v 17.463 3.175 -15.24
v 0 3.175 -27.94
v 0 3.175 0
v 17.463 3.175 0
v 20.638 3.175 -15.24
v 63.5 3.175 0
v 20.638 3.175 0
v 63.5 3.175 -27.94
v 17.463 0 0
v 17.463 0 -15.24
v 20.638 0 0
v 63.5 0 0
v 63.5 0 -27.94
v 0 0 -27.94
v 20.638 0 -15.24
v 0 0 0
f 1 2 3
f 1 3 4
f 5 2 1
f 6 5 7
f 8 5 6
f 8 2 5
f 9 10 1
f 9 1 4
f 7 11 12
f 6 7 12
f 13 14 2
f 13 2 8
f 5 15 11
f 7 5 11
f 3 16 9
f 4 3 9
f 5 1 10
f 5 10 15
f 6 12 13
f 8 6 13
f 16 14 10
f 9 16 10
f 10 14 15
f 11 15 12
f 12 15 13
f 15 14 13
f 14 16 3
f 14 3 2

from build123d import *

# Parameters (mm, degrees)
SKETCH2_W           = 63.5
SKETCH2_H           = 27.94
BOSS_EXTRUDE1_DEPTH = 3.175
SKETCH3_W           = 3.175
SKETCH3_H           = 15.24
CUT_EXTRUDE1_DEPTH  = 70.447636569


with BuildPart() as part:
    # Sketch2 → Boss-Extrude1 (new body)
    with BuildSketch(Plane(origin=(0, 0, 0), x_dir=(1, 0, 0), z_dir=(0, 1, 0))):
        with Locations((31.75, 13.97)):
            Rectangle(SKETCH2_W, SKETCH2_H)
    extrude(amount=BOSS_EXTRUDE1_DEPTH)

    # Sketch3 → Cut-Extrude1 (cut, through all)
    with BuildSketch(Plane.XZ):
        with Locations((19.05, -7.62)):
            Rectangle(SKETCH3_W, SKETCH3_H)
    extrude(amount=-CUT_EXTRUDE1_DEPTH, mode=Mode.SUBTRACT)


solid = part.part
